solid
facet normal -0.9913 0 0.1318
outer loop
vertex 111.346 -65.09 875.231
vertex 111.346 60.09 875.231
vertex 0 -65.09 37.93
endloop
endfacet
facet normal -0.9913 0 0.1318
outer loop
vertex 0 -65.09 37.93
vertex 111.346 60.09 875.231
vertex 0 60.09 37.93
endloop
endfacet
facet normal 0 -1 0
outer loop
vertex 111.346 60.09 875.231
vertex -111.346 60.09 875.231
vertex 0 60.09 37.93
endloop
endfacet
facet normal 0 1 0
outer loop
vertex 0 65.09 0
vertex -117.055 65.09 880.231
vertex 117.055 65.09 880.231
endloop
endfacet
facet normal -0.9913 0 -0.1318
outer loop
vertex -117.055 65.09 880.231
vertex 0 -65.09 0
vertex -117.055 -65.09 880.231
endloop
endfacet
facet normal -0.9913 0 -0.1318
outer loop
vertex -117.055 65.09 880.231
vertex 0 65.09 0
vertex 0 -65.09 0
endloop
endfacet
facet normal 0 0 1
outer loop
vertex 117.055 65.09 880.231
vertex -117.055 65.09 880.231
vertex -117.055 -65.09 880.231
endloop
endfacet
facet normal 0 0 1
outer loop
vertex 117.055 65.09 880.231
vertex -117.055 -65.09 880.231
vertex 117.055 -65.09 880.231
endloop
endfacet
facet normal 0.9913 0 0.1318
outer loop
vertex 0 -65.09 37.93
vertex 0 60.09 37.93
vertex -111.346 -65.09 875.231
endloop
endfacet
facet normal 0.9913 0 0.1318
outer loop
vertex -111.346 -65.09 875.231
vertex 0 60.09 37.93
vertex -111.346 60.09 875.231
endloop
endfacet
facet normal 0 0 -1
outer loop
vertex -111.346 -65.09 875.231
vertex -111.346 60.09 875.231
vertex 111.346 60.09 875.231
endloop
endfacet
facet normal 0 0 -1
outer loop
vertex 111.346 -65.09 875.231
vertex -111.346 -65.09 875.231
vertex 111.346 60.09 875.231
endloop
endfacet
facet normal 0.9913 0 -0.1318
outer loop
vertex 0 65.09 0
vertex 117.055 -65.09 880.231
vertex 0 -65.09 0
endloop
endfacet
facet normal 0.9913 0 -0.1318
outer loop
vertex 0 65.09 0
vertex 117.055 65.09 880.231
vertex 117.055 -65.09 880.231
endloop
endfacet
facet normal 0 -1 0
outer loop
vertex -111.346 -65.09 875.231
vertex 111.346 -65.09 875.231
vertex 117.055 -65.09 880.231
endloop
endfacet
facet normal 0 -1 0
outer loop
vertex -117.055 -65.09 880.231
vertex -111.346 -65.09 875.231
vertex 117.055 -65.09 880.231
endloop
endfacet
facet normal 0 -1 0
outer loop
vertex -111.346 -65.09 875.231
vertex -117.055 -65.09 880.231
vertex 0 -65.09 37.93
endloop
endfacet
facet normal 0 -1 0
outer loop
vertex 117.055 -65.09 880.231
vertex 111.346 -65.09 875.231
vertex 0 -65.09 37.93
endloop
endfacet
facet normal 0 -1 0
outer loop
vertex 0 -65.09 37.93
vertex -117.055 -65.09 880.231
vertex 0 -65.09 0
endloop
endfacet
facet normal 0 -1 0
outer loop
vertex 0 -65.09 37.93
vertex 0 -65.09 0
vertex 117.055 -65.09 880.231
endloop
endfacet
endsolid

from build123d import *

# Parameters (mm, degrees)
MAIN_EXTRUDE_DEPTH = 65.09
SHELL1_T           = -5


with BuildPart() as part:
    # Sketch1 → Main extrude (new, symmetric)
    with BuildSketch(Plane(origin=(0, 0, 0), x_dir=(1, 0, 0), z_dir=(0, 1, 0))):
        Polygon((0, 0), (-117.055, -880.2309966), (117.055, -880.2309966), align=None)
    extrude(amount=MAIN_EXTRUDE_DEPTH, both=True)

    # Shell1
    shell1_openings = [part.faces().sort_by_distance(p)[0] for p in [
        (0, -65.09, 586.8206644),
    ]]
    offset(amount=SHELL1_T, openings=shell1_openings, kind=Kind.INTERSECTION)


solid = part.part
